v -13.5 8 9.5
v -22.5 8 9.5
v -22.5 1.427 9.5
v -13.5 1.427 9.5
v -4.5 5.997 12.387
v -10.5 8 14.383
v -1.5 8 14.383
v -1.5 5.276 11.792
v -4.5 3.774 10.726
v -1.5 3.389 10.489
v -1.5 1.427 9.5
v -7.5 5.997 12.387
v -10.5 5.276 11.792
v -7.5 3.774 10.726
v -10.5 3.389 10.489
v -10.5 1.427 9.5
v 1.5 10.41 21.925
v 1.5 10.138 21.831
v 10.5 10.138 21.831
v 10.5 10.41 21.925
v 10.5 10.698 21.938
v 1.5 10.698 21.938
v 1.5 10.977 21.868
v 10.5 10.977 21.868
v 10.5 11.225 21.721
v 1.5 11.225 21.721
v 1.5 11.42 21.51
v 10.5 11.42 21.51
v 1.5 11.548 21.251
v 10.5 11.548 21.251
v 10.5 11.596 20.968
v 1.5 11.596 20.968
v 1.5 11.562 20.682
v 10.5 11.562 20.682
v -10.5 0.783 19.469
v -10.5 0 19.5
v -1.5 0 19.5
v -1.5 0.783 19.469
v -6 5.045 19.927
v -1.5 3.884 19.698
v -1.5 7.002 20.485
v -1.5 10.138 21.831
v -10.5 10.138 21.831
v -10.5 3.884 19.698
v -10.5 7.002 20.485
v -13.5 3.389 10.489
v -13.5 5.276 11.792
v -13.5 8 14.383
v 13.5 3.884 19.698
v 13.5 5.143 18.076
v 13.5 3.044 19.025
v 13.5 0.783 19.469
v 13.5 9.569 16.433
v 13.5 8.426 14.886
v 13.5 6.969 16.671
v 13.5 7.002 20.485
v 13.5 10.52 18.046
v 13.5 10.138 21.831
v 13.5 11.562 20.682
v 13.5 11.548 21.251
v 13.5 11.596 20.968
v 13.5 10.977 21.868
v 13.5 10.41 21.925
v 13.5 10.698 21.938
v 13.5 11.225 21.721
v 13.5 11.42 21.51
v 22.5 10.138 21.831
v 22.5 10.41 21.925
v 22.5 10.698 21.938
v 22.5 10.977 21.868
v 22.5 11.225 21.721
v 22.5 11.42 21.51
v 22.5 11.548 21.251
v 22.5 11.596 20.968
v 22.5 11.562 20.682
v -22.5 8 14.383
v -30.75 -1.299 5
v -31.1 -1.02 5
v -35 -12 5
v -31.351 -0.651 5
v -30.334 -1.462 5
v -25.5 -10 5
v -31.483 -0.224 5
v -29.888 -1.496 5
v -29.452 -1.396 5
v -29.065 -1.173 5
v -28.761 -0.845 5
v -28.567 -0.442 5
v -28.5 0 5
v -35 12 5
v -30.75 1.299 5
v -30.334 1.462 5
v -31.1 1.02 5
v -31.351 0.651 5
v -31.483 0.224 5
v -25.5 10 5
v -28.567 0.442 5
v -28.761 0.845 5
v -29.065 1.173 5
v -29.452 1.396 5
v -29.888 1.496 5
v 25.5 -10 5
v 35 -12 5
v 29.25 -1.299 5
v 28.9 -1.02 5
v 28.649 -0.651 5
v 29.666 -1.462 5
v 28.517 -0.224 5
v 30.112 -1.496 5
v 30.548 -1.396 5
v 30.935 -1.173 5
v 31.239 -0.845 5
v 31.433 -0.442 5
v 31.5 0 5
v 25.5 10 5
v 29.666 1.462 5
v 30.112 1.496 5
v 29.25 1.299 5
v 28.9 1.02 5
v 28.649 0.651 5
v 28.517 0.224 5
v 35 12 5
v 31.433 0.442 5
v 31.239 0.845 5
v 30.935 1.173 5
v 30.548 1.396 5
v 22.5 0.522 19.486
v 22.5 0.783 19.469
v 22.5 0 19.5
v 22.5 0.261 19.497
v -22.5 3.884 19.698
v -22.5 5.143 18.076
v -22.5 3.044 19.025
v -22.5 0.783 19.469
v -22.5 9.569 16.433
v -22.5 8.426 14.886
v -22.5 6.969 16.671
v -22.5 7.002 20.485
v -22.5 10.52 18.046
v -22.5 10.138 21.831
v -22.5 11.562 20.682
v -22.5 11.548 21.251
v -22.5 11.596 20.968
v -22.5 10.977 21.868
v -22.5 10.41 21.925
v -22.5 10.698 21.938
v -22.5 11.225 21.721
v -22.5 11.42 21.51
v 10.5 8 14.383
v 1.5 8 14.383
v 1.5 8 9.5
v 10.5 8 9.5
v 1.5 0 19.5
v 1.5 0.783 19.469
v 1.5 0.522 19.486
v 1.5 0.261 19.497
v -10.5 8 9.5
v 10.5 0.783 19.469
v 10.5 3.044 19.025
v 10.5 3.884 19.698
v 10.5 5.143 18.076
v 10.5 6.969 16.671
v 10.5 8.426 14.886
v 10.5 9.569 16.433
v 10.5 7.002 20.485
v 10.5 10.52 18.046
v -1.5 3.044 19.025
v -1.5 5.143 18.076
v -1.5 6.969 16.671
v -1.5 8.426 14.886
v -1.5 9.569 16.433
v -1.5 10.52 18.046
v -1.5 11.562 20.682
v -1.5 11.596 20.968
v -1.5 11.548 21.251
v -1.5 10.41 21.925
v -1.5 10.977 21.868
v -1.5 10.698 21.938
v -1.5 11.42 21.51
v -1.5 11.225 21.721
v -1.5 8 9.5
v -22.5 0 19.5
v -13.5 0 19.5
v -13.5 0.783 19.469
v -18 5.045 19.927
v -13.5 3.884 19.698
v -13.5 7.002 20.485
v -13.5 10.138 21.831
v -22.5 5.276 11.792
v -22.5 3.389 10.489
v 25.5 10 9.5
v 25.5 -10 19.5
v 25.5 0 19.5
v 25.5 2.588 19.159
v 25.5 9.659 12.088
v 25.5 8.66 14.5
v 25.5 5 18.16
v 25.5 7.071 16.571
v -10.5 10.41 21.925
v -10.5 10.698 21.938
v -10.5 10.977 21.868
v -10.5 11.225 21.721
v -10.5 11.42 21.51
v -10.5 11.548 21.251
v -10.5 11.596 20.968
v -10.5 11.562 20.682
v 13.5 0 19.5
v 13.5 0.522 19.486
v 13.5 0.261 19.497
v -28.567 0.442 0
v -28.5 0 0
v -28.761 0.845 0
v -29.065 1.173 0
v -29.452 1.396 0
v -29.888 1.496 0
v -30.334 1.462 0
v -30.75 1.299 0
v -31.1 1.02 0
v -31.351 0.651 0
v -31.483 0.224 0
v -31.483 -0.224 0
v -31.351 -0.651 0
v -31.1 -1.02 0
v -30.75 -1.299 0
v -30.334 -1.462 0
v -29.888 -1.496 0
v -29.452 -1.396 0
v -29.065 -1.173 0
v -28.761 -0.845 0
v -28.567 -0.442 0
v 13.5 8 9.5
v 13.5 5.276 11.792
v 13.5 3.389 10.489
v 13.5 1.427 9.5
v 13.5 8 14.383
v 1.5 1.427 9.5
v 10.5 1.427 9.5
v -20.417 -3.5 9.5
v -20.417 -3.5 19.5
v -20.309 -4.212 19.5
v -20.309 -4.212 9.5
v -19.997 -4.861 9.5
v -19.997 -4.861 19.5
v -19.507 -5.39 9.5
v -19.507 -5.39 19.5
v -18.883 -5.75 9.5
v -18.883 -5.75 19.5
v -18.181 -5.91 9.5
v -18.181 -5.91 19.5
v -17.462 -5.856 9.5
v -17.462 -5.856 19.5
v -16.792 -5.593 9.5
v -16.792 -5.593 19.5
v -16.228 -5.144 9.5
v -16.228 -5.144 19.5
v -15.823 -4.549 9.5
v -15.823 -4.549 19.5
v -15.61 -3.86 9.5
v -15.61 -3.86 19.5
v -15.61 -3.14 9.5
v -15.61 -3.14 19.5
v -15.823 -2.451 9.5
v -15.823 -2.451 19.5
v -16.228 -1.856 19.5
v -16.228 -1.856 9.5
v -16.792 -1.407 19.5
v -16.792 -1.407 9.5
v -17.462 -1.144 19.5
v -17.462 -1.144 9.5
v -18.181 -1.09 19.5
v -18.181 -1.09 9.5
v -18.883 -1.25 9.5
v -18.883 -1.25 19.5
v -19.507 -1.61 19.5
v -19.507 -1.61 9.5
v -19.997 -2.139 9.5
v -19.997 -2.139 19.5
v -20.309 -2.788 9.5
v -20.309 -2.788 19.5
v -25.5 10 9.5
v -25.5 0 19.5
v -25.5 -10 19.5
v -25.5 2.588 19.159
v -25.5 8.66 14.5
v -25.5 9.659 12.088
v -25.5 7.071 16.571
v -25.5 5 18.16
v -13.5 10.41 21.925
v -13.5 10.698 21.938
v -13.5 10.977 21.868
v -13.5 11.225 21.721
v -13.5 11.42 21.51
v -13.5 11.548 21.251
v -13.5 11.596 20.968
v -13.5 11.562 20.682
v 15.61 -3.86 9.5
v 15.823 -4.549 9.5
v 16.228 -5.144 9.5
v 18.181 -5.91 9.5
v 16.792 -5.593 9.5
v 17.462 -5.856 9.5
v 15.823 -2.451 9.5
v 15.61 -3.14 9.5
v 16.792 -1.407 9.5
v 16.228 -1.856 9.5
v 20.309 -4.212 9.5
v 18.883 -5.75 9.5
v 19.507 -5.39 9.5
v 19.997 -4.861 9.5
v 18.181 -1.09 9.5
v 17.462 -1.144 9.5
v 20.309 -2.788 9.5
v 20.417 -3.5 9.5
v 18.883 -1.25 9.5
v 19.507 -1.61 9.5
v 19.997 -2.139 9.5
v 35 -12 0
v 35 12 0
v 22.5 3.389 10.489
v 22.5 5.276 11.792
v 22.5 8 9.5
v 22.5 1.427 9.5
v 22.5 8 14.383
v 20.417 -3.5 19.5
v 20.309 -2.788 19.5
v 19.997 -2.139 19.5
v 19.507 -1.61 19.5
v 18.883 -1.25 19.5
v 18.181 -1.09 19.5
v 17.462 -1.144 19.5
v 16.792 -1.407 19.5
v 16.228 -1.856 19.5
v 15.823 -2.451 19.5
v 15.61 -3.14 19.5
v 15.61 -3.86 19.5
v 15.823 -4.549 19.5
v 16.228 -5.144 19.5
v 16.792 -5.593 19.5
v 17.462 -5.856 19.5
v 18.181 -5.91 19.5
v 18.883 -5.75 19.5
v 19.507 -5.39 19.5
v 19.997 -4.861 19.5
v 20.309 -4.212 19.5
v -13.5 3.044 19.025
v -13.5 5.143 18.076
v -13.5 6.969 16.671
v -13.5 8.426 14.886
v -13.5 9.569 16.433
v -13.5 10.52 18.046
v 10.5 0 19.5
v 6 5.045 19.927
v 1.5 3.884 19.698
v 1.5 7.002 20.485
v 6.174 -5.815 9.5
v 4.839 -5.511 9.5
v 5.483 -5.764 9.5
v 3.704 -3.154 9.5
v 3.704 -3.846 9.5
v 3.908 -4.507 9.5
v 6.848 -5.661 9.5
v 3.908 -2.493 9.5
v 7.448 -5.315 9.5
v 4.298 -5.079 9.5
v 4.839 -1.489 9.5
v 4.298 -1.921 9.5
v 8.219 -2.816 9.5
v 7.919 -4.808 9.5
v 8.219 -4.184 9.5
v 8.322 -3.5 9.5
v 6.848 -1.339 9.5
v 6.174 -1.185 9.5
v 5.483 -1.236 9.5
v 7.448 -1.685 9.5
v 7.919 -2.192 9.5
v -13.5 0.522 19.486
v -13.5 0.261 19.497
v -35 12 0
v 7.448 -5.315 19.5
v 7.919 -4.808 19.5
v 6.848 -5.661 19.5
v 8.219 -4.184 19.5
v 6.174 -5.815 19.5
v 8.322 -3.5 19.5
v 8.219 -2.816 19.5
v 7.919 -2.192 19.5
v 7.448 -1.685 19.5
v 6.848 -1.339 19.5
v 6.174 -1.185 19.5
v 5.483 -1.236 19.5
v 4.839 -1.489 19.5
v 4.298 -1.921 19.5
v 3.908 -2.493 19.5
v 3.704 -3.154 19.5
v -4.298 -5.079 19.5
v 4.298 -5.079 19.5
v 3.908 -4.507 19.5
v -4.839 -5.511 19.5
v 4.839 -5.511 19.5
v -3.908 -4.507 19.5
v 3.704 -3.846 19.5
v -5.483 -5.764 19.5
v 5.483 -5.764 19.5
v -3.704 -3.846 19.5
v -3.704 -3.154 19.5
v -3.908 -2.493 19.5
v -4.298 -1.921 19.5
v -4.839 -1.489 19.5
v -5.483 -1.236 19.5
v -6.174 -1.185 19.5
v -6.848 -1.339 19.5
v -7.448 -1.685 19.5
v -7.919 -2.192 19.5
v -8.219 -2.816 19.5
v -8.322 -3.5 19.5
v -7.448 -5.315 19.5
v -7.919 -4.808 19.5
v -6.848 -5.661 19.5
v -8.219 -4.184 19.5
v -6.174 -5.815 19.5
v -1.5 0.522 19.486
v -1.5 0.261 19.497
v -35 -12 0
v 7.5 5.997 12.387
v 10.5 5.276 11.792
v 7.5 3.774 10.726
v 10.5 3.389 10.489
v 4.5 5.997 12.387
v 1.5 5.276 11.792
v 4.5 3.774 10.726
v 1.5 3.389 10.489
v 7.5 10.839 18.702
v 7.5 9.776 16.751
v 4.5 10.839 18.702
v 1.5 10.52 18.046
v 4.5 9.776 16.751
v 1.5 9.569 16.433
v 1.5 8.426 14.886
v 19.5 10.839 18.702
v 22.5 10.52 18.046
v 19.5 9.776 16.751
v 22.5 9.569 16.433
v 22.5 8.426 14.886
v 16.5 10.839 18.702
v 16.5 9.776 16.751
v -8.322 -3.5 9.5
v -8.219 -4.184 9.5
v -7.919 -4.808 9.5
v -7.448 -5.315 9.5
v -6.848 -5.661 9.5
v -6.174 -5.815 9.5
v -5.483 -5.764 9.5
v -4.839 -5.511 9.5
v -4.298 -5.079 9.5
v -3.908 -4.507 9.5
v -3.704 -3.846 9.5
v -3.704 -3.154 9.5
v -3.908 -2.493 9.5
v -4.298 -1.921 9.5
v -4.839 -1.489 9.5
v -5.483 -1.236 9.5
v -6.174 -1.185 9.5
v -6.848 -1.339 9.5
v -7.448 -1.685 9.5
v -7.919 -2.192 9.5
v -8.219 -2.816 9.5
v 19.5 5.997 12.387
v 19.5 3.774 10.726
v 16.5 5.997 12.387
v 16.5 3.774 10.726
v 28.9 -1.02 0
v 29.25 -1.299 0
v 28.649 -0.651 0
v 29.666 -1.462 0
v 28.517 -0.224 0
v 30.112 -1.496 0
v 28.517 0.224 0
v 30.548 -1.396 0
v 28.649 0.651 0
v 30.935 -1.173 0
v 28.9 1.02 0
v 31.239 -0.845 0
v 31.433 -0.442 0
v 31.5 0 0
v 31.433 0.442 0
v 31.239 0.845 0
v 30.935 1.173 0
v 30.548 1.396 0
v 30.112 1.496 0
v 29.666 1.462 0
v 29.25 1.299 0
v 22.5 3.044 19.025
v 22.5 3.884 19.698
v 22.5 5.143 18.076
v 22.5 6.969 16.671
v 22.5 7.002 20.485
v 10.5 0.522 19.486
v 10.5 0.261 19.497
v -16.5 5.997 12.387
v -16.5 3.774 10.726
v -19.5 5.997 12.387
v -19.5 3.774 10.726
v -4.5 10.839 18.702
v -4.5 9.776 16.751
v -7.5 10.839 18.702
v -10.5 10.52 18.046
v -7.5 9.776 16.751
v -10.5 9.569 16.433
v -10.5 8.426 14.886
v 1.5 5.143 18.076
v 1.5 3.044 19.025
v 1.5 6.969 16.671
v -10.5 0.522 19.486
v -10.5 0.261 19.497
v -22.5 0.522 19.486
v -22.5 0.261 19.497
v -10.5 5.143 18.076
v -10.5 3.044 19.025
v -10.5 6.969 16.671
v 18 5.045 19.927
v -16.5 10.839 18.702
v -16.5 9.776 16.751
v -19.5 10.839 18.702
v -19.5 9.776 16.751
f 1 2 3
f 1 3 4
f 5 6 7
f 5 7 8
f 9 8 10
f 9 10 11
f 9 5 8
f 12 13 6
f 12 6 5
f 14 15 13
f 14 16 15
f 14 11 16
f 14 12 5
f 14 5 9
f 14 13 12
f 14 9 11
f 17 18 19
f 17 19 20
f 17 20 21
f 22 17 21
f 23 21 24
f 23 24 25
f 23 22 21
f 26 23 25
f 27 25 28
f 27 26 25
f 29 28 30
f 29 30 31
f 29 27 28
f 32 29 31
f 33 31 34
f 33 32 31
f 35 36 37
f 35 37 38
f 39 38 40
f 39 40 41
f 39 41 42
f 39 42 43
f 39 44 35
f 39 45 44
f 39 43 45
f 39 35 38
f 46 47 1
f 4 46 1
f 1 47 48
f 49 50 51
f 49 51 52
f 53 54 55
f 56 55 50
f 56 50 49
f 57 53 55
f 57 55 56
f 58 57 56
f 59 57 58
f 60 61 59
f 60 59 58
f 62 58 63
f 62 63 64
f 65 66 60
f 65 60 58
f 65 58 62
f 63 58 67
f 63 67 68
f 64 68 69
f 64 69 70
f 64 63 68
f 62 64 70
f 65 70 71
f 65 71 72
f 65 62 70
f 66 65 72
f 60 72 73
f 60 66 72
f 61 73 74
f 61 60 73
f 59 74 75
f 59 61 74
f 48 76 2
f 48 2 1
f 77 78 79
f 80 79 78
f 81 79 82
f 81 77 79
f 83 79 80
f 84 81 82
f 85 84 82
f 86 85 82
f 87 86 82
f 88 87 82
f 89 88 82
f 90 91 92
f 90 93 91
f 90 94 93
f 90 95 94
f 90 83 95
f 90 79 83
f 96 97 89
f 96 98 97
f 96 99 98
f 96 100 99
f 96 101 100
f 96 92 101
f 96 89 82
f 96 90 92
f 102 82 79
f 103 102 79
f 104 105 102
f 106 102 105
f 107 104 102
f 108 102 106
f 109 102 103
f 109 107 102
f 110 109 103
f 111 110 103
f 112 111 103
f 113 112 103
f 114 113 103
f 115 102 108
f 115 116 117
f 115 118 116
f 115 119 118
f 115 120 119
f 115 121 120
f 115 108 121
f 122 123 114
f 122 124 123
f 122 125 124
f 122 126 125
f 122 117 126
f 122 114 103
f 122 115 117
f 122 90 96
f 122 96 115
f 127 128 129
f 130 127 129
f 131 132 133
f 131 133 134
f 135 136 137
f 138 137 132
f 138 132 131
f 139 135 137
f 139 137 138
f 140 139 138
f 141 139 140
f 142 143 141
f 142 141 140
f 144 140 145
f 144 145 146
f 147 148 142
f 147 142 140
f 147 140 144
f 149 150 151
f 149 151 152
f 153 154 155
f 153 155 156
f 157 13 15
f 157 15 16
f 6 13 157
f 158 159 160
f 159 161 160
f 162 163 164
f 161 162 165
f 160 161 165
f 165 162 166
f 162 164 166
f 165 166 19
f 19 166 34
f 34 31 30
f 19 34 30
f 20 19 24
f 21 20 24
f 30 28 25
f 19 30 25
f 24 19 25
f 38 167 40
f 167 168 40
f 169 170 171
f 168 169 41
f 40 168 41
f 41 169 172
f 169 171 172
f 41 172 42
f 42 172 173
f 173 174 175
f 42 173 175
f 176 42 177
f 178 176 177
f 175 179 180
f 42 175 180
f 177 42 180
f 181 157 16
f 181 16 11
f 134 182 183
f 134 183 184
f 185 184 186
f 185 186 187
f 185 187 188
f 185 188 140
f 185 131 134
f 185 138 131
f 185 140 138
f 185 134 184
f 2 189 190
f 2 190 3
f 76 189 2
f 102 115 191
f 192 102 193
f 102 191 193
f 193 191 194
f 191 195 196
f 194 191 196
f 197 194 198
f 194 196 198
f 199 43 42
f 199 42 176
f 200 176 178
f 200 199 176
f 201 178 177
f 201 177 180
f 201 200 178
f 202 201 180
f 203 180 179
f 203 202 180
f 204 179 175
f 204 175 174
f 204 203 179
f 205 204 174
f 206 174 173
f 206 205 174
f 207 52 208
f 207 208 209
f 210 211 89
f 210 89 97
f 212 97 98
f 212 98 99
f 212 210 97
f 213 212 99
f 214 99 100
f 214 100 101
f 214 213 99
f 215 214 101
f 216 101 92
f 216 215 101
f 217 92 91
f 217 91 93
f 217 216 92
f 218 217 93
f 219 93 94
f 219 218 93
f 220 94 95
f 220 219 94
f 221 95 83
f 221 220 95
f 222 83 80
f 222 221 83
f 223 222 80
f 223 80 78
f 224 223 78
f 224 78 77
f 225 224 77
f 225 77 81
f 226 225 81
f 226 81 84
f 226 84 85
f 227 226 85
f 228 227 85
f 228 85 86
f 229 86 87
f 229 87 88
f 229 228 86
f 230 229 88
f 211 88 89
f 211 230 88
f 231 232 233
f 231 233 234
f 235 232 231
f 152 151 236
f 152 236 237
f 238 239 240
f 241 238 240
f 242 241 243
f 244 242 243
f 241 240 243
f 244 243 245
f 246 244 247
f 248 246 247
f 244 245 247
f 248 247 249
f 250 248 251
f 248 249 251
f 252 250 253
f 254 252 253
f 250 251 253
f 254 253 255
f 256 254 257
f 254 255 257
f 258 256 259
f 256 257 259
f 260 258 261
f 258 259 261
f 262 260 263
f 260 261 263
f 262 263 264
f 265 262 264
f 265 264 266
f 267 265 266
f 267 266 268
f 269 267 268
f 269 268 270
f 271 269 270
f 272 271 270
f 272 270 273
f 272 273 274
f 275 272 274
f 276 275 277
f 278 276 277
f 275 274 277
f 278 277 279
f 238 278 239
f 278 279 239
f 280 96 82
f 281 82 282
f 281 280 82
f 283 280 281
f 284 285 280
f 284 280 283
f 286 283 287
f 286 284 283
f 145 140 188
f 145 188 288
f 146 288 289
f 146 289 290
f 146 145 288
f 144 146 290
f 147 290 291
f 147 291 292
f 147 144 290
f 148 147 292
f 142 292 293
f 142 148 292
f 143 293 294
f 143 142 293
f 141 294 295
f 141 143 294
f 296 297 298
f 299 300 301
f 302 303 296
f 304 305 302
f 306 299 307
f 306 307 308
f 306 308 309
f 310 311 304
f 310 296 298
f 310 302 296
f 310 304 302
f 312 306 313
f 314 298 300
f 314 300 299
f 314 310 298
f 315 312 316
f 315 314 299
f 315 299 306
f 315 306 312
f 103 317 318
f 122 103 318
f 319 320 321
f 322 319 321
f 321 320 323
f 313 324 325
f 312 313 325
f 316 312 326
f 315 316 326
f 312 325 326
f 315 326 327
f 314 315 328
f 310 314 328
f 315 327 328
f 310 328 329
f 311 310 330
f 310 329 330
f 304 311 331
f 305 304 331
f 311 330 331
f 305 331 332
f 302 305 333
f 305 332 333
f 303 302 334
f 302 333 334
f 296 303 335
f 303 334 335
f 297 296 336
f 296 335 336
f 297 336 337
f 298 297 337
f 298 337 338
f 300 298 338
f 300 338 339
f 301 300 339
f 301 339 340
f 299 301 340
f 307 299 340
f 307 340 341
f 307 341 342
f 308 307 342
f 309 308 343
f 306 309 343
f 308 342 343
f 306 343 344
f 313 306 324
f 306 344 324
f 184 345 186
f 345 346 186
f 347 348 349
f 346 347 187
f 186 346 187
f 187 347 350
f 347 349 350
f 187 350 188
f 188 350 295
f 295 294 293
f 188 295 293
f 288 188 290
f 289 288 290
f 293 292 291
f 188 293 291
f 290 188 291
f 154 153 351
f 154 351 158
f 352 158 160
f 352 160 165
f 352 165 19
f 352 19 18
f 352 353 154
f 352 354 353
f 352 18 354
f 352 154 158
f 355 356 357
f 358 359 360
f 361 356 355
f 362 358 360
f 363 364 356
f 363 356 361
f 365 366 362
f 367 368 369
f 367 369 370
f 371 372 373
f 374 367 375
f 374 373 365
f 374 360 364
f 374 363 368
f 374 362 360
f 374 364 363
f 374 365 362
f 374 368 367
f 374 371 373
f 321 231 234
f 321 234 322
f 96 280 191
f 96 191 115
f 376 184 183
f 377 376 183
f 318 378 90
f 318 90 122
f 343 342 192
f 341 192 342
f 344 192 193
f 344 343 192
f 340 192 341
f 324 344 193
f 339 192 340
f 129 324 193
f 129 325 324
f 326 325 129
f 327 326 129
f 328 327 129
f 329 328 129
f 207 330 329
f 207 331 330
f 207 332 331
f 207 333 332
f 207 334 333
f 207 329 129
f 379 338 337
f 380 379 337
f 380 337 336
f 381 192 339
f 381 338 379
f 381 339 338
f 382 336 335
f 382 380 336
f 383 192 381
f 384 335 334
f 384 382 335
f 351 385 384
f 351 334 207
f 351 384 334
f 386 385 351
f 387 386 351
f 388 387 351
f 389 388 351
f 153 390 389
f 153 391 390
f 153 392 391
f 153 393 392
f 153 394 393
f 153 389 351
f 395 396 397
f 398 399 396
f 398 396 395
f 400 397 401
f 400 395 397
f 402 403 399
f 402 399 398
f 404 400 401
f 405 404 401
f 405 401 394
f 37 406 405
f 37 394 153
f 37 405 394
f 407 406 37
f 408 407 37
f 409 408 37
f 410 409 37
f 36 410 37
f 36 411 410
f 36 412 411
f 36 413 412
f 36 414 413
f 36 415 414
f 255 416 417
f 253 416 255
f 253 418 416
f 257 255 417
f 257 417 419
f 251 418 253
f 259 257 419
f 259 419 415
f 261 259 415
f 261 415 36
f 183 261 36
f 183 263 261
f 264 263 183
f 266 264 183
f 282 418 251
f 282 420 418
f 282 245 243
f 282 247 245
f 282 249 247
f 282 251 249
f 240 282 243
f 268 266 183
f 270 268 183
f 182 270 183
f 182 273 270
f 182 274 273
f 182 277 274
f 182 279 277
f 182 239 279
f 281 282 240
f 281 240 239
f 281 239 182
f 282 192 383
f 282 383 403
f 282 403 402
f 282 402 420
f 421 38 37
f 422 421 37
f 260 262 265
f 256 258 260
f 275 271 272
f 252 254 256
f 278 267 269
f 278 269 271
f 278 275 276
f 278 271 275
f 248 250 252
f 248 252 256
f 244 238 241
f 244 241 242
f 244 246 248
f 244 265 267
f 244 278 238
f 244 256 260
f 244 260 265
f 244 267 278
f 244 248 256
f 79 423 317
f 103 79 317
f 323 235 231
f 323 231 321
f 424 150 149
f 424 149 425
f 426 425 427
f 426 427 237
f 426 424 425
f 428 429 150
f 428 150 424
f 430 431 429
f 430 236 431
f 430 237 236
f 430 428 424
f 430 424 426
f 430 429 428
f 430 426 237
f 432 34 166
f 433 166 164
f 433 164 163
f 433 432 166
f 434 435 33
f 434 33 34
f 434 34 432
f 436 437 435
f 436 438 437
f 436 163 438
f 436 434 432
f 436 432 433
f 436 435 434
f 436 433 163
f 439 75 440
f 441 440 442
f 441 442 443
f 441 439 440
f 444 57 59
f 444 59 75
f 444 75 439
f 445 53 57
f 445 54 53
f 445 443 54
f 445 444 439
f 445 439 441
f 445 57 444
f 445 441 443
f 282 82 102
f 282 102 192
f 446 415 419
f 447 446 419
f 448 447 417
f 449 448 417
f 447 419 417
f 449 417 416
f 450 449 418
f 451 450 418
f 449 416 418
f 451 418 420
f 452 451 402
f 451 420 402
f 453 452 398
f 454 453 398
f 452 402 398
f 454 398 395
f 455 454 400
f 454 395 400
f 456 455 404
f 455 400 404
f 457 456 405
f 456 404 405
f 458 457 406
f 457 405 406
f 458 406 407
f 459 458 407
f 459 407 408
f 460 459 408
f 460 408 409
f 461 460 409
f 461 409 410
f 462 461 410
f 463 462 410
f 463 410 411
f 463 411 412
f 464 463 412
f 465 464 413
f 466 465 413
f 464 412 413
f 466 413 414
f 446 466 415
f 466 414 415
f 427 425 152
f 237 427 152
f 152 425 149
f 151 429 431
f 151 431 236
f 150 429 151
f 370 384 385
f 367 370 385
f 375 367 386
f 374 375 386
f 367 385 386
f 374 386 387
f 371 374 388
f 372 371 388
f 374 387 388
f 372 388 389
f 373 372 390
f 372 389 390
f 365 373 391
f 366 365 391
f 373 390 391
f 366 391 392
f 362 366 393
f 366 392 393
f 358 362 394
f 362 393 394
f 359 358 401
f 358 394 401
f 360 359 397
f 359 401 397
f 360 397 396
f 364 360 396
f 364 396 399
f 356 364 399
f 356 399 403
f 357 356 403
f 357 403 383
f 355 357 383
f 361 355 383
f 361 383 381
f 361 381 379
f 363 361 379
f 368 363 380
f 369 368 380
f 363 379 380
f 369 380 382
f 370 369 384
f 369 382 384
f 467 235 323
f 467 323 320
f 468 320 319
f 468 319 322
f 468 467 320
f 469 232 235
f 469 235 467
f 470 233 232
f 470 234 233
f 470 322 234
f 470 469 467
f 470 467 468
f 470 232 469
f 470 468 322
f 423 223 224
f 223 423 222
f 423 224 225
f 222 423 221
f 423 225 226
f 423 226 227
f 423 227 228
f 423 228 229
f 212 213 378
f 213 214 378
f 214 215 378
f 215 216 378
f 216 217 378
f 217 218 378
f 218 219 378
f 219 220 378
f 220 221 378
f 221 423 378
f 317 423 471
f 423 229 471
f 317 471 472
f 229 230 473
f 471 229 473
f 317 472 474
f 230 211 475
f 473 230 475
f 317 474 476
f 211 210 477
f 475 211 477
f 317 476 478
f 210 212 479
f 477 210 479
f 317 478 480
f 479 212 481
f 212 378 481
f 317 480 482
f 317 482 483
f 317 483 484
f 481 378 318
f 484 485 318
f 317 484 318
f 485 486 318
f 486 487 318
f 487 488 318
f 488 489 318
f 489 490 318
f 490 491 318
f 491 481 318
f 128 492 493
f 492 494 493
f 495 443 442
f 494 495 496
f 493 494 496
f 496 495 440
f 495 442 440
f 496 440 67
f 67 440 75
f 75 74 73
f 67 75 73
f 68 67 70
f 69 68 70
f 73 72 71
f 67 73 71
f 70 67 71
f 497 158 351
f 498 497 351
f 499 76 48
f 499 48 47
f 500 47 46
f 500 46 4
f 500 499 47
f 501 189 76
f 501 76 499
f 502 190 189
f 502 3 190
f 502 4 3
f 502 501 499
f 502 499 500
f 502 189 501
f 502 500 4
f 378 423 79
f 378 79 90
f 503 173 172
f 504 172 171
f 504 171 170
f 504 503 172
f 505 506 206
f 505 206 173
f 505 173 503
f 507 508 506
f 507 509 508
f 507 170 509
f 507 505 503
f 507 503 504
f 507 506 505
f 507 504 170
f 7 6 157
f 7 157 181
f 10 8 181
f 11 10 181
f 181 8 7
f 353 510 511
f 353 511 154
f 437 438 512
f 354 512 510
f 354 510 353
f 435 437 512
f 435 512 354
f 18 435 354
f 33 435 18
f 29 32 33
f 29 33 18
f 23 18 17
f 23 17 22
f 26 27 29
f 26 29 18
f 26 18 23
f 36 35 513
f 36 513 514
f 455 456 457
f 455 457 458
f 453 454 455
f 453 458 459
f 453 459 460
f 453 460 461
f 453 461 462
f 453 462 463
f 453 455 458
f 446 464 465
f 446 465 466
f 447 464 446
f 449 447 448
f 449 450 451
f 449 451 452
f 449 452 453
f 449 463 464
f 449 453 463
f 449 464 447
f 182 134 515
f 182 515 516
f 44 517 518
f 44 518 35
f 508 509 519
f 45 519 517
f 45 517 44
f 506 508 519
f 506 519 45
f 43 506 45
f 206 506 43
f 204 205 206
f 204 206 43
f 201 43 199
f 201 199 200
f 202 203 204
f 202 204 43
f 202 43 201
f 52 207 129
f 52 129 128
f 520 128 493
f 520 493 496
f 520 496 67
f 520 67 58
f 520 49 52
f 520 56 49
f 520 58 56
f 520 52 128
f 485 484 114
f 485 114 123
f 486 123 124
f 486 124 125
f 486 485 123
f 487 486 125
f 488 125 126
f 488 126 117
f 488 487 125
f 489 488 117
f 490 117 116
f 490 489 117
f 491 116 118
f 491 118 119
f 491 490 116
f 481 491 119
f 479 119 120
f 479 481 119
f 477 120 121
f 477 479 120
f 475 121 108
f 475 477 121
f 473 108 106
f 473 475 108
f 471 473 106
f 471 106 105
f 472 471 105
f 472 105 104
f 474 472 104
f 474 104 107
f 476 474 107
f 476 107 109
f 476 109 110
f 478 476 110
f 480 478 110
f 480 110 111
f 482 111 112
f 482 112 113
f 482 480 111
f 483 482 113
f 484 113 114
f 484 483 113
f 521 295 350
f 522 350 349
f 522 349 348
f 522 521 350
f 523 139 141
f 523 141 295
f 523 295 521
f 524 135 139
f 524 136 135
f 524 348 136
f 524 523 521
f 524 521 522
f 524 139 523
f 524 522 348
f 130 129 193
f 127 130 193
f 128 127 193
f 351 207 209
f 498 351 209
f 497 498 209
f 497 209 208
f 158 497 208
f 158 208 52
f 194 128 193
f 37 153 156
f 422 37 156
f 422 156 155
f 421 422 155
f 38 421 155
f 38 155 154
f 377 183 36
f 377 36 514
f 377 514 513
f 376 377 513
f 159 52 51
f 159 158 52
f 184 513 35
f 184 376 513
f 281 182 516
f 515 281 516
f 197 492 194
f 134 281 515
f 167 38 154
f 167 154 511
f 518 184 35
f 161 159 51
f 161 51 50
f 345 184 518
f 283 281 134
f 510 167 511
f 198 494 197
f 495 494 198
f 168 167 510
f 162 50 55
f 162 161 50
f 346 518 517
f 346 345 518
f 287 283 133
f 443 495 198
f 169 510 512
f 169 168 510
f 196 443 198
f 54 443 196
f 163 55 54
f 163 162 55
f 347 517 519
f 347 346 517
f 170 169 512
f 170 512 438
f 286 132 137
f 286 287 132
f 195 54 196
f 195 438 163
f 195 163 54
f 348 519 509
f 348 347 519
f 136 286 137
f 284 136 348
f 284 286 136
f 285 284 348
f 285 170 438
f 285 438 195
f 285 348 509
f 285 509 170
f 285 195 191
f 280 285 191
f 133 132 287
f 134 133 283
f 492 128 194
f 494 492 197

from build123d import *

# Parameters (mm, degrees)
SKETCH1_W                = 70
SKETCH1_H                = 24
SKETCH1_R                = 1.5
BOSS_EXTRUDE1_DEPTH      = 5
BOSS_EXTRUDE2_DEPTH      = 25.5
BOSS_EXTRUDE2_DEPTH_BACK = 25.5
SKETCH3_R                = 2.321982534
SKETCH3_R_2              = 2.416824645
SKETCH3_W                = 9
SKETCH3_H                = 8
CUT_EXTRUDE1_DEPTH       = 10
BOSS_EXTRUDE3_DEPTH      = 9
BOSS_EXTRUDE4_DEPTH      = 9
BOSS_EXTRUDE5_DEPTH      = 9
BOSS_EXTRUDE6_DEPTH      = 9


with BuildPart() as part:
    # Sketch1 → Boss-Extrude1 (new body)
    with BuildSketch(Plane.XY):
        Rectangle(SKETCH1_W, SKETCH1_H)
        with Locations((-30, 0)):
            Circle(SKETCH1_R, mode=Mode.SUBTRACT)
        with Locations((30, 0)):
            Circle(SKETCH1_R, mode=Mode.SUBTRACT)
    extrude(amount=BOSS_EXTRUDE1_DEPTH)

    # Sketch2 → Boss-Extrude2 (add, two sides: drawn at the far end of the back side and taken through both)
    with BuildSketch(Plane(origin=(0, 0, 0), x_dir=(0, 0, -1), z_dir=(1, 0, 0)).offset(-BOSS_EXTRUDE2_DEPTH_BACK)):
        with BuildLine():
            Line((-5, -10), (-19.5, -10))
            Line((-19.5, -10), (-19.5, 0))
            ThreePointArc((-19.5, 0), (-16.571067812, 7.071067812), (-9.5, 10))
            Line((-9.5, 10), (-5, 10))
            Line((-5, 10), (-5, -10))
        make_face()
    extrude(amount=BOSS_EXTRUDE2_DEPTH + BOSS_EXTRUDE2_DEPTH_BACK)

    # Sketch3 → Cut-Extrude1 (cut)
    with BuildSketch(Plane.XY.offset(19.5)):
        with Locations((6, -3.5)):
            Circle(SKETCH3_R)
        with Locations((18, -3.5)):
            Circle(SKETCH3_R_2)
        with Locations((-18, -3.5)):
            Circle(SKETCH3_R_2)
        with Locations((-6, -3.5)):
            Circle(SKETCH3_R)
        with Locations((6, 4)):
            Rectangle(SKETCH3_W, SKETCH3_H)
        with Locations((18, 4)):
            Rectangle(SKETCH3_W, SKETCH3_H)
        with Locations((-18, 4)):
            Rectangle(SKETCH3_W, SKETCH3_H)
        with Locations((-6, 4)):
            Rectangle(SKETCH3_W, SKETCH3_H)
    extrude(amount=-CUT_EXTRUDE1_DEPTH, mode=Mode.SUBTRACT)

    # Sketch4 → Boss-Extrude3 (add)
    with BuildSketch(Plane.ZY.offset(22.5)):
        with BuildLine():
            Line((9.015316461, 0), (19.5, 0))
            add(Edge.make_bspline(
                [(19.5, 0), (19.395916198, 1.673959857), (19.680366362, 5.037515591), (20.950052063, 8.432343367), (21.831203798, 10.137575266)],
                knots=[0, 0, 0, 0, 0.423484127, 0.846968255, 0.846968255, 0.846968255, 0.846968255], degree=3))
            ThreePointArc((21.831203798, 10.137575266), (21.720999609, 11.224662671), (20.681702642, 11.56195454))
            add(Edge.make_bspline(
                [(20.681702642, 11.56195454), (15.653773695, 10.201988893), (10.35157066, 5.000520578), (9.015316461, 0)],
                knots=[0.123886132, 0.123886132, 0.123886132, 0.123886132, 1, 1, 1, 1], degree=3))
        make_face()
    extrude(amount=-BOSS_EXTRUDE3_DEPTH)

    # Sketch6 → Boss-Extrude4 (add)
    with BuildSketch(Plane(origin=(-10.5, 0, 0), x_dir=(0, 0, -1), z_dir=(1, 0, 0))):
        with BuildLine():
            Line((-9.015316461, 0), (-19.5, 0))
            add(Edge.make_bspline(
                [(-19.5, 0), (-19.395916198, 1.673959857), (-19.680366362, 5.037515591), (-20.950052063, 8.432343367), (-21.831203798, 10.137575266)],
                knots=[0, 0, 0, 0, 0.423484127, 0.846968255, 0.846968255, 0.846968255, 0.846968255], degree=3))
            ThreePointArc((-21.831203798, 10.137575266), (-21.720999609, 11.224662671), (-20.681702642, 11.56195454))
            add(Edge.make_bspline(
                [(-20.681702642, 11.56195454), (-15.653773695, 10.201988893), (-10.35157066, 5.000520578), (-9.015316461, 0)],
                knots=[0.123886132, 0.123886132, 0.123886132, 0.123886132, 1, 1, 1, 1], degree=3))
        make_face()
    extrude(amount=BOSS_EXTRUDE4_DEPTH)

    # Sketch7 → Boss-Extrude5 (add)
    with BuildSketch(Plane(origin=(1.5, 0, 0), x_dir=(0, 0, -1), z_dir=(1, 0, 0))):
        with BuildLine():
            Line((-9.015316461, 0), (-19.5, 0))
            add(Edge.make_bspline(
                [(-19.5, 0), (-19.395916198, 1.673959857), (-19.680366362, 5.037515591), (-20.950052063, 8.432343367), (-21.831203798, 10.137575266)],
                knots=[0, 0, 0, 0, 0.423484127, 0.846968255, 0.846968255, 0.846968255, 0.846968255], degree=3))
            ThreePointArc((-21.831203798, 10.137575266), (-21.720999609, 11.224662671), (-20.681702642, 11.56195454))
            add(Edge.make_bspline(
                [(-20.681702642, 11.56195454), (-15.653773695, 10.201988893), (-10.35157066, 5.000520578), (-9.015316461, 0)],
                knots=[0.123886132, 0.123886132, 0.123886132, 0.123886132, 1, 1, 1, 1], degree=3))
        make_face()
    extrude(amount=BOSS_EXTRUDE5_DEPTH)

    # Sketch8 → Boss-Extrude6 (add)
    with BuildSketch(Plane(origin=(13.5, 0, 0), x_dir=(0, 0, -1), z_dir=(1, 0, 0))):
        with BuildLine():
            Line((-9.015316461, 0), (-19.5, 0))
            add(Edge.make_bspline(
                [(-19.5, 0), (-19.395916198, 1.673959857), (-19.680366362, 5.037515591), (-20.950052063, 8.432343367), (-21.831203798, 10.137575266)],
                knots=[0, 0, 0, 0, 0.423484127, 0.846968255, 0.846968255, 0.846968255, 0.846968255], degree=3))
            ThreePointArc((-21.831203798, 10.137575266), (-21.720999609, 11.224662671), (-20.681702642, 11.56195454))
            add(Edge.make_bspline(
                [(-20.681702642, 11.56195454), (-15.653773695, 10.201988893), (-10.35157066, 5.000520578), (-9.015316461, 0)],
                knots=[0.123886132, 0.123886132, 0.123886132, 0.123886132, 1, 1, 1, 1], degree=3))
        make_face()
    extrude(amount=BOSS_EXTRUDE6_DEPTH)


solid = part.part
